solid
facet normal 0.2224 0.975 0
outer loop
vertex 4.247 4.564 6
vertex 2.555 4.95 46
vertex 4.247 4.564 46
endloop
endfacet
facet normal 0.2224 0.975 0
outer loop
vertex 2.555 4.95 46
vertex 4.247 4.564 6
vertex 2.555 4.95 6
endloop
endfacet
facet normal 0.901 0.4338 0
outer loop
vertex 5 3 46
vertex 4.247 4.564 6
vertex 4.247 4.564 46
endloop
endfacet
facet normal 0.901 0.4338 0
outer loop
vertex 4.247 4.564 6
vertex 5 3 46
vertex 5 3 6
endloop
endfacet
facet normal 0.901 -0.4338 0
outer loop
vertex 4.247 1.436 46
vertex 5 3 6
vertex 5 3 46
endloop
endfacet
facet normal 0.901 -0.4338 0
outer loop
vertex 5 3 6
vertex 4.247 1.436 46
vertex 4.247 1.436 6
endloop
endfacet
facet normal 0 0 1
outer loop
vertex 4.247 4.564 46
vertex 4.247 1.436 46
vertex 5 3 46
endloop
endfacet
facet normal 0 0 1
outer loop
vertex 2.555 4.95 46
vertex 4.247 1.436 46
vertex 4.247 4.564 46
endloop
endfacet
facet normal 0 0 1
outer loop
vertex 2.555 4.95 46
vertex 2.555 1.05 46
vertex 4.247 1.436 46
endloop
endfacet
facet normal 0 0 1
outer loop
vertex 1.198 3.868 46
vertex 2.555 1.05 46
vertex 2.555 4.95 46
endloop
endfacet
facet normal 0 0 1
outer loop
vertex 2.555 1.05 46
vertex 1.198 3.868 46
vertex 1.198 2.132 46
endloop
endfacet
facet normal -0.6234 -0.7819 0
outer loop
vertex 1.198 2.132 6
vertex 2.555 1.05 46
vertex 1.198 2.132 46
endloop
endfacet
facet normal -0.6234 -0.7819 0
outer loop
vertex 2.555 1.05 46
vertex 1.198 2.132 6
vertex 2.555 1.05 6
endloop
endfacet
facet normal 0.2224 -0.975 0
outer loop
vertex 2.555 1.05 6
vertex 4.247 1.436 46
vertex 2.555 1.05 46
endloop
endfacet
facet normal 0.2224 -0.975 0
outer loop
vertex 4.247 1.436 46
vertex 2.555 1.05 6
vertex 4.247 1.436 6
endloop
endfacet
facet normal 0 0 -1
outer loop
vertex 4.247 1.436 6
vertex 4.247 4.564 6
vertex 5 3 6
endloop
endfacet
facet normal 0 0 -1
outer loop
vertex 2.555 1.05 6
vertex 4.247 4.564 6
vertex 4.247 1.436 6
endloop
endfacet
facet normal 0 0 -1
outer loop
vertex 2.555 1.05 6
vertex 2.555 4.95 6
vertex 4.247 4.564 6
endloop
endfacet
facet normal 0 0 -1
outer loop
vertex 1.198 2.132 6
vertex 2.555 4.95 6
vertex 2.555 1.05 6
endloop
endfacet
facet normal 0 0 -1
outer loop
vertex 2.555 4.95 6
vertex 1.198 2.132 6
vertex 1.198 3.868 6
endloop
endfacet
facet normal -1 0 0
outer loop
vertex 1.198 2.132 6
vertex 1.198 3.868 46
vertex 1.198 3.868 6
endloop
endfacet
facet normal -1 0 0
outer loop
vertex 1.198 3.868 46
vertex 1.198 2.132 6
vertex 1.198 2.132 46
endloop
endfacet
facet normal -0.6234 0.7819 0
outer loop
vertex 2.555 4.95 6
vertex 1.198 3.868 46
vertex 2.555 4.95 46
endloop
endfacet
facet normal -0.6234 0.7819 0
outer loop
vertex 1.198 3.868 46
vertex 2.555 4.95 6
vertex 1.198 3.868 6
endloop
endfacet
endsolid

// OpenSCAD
// 28BYJ-48 from RGriffoGoes 
// at http://www.thingiverse.com/thing:204734
// named and measured dimensions, and
// added details by J.Beale 21 July 2014

MBH = 18.8;   // motor body height
MBD = 28.25;  // motor body OD
SBD = 9.1;    // shaft boss OD
SBH = 1.45;   // shaft boss height above motor body
SBO = 7.875;  // offset of shaft/boss center from motor center
SHD = 4.93;   // motor shaft OD
SHDF = 3.0;   // motor shaft diameter, across flats
SHHF = 6.0;   // motor shaft flats height, or depth in from end
SHH = 9.75;   // height of shaft above motor body 

MBFH = 0.7;   // height of body edge flange protruding above surface
MBFW = 1.0;   // width of edge flange
MBFNW = 8;    // width of notch in edge flange
MBFNW2 = 17.8;  // width of edge flange notch above wiring box

MHCC = 35.0;  // mounting hole center-to-center
MTH  = 0.8;   // mounting tab thickness
MTW  = 7.0;   // mounting tab width
WBH  = 16.7;  // plastic wiring box height
WBW  = 14.6;  // plastic wiring box width
WBD  = 31.3;  // body diameter to outer surface of wiring box

WRD = 1.0;     // diameter of electrical wires
WRL = 30;      // length of electrical wires
WRO = 2.2;		// offset of wires below top motor surface

// =========================================================
eps = 0.05;   // small number to avoid coincident faces



  difference(){
      
  translate([3,3,6]){
    cylinder(h=40, r=2);
}
    union(){
		translate([SBO,0,-SHH])	// motor shaft
        difference() {
			color("blue") cylinder(h = MBH, r = SHD/2, center = true, $fn = 32);
				// shaft flats
		   color("red") translate([(SHD+SHDF)/2,0,-(eps+MBH-SHHF)/2]) 
				cube([SHD,SHD,SHHF], center = true);
		   color("red") translate([-(SHD+SHDF)/2,0,-(eps+MBH-SHHF)/2]) 
				cube([SHD,SHD,SHHF], center = true);
        }
		}

		}
	
